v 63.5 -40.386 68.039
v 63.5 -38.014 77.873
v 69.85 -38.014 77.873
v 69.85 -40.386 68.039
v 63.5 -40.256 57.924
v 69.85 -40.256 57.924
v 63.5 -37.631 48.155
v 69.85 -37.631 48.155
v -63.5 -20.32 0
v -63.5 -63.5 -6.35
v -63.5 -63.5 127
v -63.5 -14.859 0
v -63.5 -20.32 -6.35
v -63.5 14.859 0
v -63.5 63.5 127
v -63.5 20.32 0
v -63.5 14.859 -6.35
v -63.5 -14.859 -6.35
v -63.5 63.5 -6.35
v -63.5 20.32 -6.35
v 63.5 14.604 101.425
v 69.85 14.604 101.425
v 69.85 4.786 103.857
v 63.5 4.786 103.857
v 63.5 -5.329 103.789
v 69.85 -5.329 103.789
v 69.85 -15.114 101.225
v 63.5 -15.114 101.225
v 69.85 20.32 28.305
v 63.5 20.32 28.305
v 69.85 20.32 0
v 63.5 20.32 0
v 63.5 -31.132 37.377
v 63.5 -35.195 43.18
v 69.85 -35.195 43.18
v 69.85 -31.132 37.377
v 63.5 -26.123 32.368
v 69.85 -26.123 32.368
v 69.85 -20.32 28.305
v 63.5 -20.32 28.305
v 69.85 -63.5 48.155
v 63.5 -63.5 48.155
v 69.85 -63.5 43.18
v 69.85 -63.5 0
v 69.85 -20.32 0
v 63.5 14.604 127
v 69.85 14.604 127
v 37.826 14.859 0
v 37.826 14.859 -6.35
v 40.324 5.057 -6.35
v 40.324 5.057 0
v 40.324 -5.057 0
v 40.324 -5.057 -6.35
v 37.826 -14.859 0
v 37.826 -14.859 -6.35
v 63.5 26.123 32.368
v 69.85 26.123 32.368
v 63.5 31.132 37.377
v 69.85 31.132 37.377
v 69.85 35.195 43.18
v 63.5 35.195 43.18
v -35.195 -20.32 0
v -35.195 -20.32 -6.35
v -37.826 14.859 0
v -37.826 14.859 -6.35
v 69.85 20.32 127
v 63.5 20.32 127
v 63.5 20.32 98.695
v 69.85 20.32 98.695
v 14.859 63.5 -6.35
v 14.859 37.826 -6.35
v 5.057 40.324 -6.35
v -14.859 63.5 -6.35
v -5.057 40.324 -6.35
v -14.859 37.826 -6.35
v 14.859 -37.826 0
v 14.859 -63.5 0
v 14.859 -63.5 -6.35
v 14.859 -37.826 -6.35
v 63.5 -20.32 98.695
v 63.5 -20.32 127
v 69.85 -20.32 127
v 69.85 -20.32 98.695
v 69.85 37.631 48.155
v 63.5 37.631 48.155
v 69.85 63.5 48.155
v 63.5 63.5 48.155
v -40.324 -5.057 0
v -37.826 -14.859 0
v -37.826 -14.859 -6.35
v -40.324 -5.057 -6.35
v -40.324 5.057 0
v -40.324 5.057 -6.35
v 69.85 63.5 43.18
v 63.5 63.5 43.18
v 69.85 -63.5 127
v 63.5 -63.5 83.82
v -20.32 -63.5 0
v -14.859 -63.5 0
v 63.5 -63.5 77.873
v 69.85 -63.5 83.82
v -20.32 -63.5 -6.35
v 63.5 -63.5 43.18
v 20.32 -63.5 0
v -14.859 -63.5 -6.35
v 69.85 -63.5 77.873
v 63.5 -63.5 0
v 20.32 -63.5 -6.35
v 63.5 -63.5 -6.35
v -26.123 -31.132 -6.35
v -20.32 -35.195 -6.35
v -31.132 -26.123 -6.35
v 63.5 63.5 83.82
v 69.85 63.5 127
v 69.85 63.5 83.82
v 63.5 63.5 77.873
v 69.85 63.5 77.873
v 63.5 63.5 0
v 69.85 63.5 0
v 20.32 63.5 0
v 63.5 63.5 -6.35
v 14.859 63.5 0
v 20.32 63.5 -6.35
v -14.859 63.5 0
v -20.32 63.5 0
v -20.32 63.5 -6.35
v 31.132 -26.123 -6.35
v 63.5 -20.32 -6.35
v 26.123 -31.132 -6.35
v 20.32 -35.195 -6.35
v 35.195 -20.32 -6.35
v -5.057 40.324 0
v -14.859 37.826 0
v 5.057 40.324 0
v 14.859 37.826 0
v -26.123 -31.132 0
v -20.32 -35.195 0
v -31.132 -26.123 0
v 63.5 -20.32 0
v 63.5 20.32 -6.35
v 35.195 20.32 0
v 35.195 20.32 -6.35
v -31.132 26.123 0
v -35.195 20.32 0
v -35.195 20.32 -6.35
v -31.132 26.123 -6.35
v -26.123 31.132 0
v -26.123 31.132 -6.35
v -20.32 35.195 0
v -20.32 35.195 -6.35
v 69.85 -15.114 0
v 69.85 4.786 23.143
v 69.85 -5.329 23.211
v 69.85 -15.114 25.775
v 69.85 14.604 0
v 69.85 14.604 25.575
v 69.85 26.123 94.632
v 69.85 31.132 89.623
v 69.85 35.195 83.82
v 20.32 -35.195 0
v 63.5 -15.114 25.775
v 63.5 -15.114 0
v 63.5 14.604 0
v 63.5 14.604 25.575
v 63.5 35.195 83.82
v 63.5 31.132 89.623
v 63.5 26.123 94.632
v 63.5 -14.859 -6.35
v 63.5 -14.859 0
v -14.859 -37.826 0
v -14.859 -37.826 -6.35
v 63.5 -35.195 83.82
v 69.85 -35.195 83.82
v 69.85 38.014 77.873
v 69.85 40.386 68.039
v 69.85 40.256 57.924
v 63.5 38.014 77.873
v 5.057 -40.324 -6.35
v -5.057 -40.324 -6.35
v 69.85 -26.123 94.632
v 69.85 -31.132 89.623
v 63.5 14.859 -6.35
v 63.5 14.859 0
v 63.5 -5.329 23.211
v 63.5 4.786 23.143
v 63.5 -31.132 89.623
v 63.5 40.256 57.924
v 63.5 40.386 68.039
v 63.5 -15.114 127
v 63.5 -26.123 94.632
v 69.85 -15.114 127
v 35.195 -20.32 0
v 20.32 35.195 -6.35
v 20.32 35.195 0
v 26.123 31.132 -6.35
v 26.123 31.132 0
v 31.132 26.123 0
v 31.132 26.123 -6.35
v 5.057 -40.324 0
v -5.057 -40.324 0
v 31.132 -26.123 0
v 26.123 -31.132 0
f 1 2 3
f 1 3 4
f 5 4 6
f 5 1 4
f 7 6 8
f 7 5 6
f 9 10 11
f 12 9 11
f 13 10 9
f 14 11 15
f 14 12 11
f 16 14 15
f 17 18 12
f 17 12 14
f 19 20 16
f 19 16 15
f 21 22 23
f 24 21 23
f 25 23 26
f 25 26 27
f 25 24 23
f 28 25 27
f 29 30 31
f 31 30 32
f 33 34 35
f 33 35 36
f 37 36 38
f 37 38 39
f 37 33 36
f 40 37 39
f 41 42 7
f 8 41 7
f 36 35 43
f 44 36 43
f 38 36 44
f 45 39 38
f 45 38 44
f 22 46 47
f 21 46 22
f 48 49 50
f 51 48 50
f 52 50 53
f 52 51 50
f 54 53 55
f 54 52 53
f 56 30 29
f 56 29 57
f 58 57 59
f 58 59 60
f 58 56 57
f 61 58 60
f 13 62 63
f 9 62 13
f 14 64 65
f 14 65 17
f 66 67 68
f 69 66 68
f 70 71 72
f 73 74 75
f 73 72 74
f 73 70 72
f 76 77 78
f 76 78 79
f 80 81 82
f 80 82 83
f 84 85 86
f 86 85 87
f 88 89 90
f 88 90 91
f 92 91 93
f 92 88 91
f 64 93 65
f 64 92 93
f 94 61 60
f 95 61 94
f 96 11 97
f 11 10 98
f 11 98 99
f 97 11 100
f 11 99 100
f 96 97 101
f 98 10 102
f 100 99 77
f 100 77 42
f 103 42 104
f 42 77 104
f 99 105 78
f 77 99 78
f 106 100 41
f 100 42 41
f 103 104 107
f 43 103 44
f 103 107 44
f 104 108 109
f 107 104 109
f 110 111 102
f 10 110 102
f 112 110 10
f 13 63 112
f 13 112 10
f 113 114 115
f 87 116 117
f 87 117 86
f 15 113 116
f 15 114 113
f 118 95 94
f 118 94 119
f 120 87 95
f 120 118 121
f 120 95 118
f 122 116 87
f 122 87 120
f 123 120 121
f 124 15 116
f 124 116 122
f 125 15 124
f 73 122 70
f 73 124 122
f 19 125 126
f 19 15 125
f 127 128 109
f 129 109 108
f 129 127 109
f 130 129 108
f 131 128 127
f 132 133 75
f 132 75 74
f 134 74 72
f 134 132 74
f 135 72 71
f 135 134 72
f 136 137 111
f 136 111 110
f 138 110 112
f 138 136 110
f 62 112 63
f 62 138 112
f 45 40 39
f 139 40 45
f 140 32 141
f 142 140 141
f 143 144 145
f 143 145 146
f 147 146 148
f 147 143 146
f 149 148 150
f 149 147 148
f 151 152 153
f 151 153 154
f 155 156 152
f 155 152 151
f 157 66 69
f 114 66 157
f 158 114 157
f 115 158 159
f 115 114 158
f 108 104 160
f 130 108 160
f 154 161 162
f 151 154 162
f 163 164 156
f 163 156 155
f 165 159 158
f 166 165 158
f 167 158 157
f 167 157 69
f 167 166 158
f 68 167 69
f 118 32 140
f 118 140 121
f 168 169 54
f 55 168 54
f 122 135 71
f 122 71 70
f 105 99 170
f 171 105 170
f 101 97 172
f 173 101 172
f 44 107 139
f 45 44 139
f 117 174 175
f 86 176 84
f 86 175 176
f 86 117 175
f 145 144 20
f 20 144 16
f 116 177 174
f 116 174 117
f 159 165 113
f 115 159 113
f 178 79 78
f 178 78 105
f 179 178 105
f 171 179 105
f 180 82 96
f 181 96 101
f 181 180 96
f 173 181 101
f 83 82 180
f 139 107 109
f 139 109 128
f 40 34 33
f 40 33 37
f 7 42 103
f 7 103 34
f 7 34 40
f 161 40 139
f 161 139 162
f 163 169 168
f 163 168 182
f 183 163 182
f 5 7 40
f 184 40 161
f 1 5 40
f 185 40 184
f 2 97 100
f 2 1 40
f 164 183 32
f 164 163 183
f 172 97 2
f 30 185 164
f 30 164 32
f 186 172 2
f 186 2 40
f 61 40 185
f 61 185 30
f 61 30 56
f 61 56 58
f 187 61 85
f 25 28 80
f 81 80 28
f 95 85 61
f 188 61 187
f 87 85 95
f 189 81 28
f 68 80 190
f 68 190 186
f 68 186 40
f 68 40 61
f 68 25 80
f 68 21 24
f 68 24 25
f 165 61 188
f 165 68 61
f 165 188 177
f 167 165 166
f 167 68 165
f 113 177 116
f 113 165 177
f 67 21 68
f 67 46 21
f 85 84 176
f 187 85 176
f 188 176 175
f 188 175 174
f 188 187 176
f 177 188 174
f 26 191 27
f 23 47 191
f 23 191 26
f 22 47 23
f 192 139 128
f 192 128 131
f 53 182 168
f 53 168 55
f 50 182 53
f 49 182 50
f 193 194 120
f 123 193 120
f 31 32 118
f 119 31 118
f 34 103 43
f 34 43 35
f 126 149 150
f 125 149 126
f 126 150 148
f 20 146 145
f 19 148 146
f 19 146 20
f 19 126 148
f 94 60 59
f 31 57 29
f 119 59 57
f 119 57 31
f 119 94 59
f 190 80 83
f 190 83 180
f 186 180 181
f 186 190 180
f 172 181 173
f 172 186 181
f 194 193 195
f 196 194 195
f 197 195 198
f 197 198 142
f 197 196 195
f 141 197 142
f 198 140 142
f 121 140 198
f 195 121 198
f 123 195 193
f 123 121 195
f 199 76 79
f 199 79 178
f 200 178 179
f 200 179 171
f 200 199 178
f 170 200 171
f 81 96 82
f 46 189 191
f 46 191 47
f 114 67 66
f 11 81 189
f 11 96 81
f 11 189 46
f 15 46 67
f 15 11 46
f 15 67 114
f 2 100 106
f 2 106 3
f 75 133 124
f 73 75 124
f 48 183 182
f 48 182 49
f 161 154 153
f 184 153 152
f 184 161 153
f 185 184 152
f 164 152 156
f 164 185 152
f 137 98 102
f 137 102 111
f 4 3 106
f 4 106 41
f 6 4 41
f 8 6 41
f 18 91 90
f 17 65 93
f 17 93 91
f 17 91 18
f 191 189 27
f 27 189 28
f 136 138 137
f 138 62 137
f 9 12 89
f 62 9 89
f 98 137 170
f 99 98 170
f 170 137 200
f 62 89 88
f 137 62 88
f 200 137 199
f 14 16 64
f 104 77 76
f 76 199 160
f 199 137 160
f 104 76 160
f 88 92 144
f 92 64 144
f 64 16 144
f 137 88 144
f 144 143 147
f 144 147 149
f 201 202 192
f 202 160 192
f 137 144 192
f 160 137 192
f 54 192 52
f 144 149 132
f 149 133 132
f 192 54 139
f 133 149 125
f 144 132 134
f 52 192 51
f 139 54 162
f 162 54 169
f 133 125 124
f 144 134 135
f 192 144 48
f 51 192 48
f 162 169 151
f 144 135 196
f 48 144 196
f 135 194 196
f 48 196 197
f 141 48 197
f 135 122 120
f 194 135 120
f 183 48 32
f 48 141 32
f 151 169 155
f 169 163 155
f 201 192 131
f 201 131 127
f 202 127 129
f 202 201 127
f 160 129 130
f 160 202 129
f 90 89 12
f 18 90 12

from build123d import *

# Parameters (mm, degrees)
SKETCH1_W           = 127
SKETCH1_H           = 127
BOSS_EXTRUDE1_DEPTH = 127
SKETCH13_W          = 43.18
SKETCH13_H          = 43.18
SKETCH13_W_2        = 29.718
SKETCH13_H_2        = 29.718
BOSS_EXTRUDE7_DEPTH = 6.35
SKETCH29_R          = 40.64
CUT_EXTRUDE10_DEPTH = 6.35
SKETCH27_W          = 43.18
SKETCH27_H          = 43.18
SKETCH27_W_2        = 29.718
SKETCH27_H_2        = 29.718
BOSS_EXTRUDE8_DEPTH = 6.35
SKETCH28_R          = 40.64
CUT_EXTRUDE11_DEPTH = 6.35


with BuildPart() as part:
    # Sketch1 → Boss-Extrude1 (new body)
    with BuildSketch(Plane.XY):
        Rectangle(SKETCH1_W, SKETCH1_H)
    extrude(amount=BOSS_EXTRUDE1_DEPTH)

    # Sketch13 → Boss-Extrude7 (add)
    with BuildSketch(Plane(origin=(0, 0, 0), x_dir=(-1, 0, 0), z_dir=(0, 0, -1))):
        with Locations((-41.91, 41.91)):
            Rectangle(SKETCH13_W, SKETCH13_H)
        with Locations((-41.91, -41.91)):
            Rectangle(SKETCH13_W, SKETCH13_H)
        with Locations((41.91, 41.91)):
            Rectangle(SKETCH13_W, SKETCH13_H)
        with Locations((41.91, -41.91)):
            Rectangle(SKETCH13_W, SKETCH13_H)
        with Locations((-48.641, 0)):
            Rectangle(SKETCH13_W_2, SKETCH13_H_2)
        with Locations((0, -48.641)):
            Rectangle(SKETCH13_W_2, SKETCH13_H_2)
        with Locations((48.641, 0)):
            Rectangle(SKETCH13_W_2, SKETCH13_H_2)
        with Locations((0, 48.641)):
            Rectangle(SKETCH13_W_2, SKETCH13_H_2)
    extrude(amount=BOSS_EXTRUDE7_DEPTH)

    # Sketch29 → Cut-Extrude10 (cut)
    with BuildSketch(Plane(origin=(0, 0, 0), x_dir=(-1, 0, 0), z_dir=(0, 0, -1))):
        Circle(SKETCH29_R)
    extrude(amount=CUT_EXTRUDE10_DEPTH, mode=Mode.SUBTRACT)

    # Sketch27 → Boss-Extrude8 (add)
    with BuildSketch(Plane(origin=(63.5, 0, 0), x_dir=(0, 0, -1), z_dir=(1, 0, 0))):
        with Locations((-105.41, 41.91)):
            Rectangle(SKETCH27_W, SKETCH27_H)
        with Locations((-105.41, -41.91)):
            Rectangle(SKETCH27_W, SKETCH27_H)
        with Locations((-21.59, 41.91)):
            Rectangle(SKETCH27_W, SKETCH27_H)
        with Locations((-21.59, -41.91)):
            Rectangle(SKETCH27_W, SKETCH27_H)
        with Locations((-112.141, -0.254760407)):
            Rectangle(SKETCH27_W_2, SKETCH27_H_2)
        with Locations((-63.013602448, -48.641)):
            Rectangle(SKETCH27_W_2, SKETCH27_H_2)
        with Locations((-14.859, -0.254760407)):
            Rectangle(SKETCH27_W_2, SKETCH27_H_2)
        with Locations((-63.013602448, 48.641)):
            Rectangle(SKETCH27_W_2, SKETCH27_H_2)
    extrude(amount=BOSS_EXTRUDE8_DEPTH)

    # Sketch28 → Cut-Extrude11 (cut)
    with BuildSketch(Plane(origin=(63.5, 0, 0), x_dir=(0, 0, -1), z_dir=(1, 0, 0))):
        with Locations((-63.5, 0)):
            Circle(SKETCH28_R)
    extrude(amount=CUT_EXTRUDE11_DEPTH, mode=Mode.SUBTRACT)


solid = part.part
